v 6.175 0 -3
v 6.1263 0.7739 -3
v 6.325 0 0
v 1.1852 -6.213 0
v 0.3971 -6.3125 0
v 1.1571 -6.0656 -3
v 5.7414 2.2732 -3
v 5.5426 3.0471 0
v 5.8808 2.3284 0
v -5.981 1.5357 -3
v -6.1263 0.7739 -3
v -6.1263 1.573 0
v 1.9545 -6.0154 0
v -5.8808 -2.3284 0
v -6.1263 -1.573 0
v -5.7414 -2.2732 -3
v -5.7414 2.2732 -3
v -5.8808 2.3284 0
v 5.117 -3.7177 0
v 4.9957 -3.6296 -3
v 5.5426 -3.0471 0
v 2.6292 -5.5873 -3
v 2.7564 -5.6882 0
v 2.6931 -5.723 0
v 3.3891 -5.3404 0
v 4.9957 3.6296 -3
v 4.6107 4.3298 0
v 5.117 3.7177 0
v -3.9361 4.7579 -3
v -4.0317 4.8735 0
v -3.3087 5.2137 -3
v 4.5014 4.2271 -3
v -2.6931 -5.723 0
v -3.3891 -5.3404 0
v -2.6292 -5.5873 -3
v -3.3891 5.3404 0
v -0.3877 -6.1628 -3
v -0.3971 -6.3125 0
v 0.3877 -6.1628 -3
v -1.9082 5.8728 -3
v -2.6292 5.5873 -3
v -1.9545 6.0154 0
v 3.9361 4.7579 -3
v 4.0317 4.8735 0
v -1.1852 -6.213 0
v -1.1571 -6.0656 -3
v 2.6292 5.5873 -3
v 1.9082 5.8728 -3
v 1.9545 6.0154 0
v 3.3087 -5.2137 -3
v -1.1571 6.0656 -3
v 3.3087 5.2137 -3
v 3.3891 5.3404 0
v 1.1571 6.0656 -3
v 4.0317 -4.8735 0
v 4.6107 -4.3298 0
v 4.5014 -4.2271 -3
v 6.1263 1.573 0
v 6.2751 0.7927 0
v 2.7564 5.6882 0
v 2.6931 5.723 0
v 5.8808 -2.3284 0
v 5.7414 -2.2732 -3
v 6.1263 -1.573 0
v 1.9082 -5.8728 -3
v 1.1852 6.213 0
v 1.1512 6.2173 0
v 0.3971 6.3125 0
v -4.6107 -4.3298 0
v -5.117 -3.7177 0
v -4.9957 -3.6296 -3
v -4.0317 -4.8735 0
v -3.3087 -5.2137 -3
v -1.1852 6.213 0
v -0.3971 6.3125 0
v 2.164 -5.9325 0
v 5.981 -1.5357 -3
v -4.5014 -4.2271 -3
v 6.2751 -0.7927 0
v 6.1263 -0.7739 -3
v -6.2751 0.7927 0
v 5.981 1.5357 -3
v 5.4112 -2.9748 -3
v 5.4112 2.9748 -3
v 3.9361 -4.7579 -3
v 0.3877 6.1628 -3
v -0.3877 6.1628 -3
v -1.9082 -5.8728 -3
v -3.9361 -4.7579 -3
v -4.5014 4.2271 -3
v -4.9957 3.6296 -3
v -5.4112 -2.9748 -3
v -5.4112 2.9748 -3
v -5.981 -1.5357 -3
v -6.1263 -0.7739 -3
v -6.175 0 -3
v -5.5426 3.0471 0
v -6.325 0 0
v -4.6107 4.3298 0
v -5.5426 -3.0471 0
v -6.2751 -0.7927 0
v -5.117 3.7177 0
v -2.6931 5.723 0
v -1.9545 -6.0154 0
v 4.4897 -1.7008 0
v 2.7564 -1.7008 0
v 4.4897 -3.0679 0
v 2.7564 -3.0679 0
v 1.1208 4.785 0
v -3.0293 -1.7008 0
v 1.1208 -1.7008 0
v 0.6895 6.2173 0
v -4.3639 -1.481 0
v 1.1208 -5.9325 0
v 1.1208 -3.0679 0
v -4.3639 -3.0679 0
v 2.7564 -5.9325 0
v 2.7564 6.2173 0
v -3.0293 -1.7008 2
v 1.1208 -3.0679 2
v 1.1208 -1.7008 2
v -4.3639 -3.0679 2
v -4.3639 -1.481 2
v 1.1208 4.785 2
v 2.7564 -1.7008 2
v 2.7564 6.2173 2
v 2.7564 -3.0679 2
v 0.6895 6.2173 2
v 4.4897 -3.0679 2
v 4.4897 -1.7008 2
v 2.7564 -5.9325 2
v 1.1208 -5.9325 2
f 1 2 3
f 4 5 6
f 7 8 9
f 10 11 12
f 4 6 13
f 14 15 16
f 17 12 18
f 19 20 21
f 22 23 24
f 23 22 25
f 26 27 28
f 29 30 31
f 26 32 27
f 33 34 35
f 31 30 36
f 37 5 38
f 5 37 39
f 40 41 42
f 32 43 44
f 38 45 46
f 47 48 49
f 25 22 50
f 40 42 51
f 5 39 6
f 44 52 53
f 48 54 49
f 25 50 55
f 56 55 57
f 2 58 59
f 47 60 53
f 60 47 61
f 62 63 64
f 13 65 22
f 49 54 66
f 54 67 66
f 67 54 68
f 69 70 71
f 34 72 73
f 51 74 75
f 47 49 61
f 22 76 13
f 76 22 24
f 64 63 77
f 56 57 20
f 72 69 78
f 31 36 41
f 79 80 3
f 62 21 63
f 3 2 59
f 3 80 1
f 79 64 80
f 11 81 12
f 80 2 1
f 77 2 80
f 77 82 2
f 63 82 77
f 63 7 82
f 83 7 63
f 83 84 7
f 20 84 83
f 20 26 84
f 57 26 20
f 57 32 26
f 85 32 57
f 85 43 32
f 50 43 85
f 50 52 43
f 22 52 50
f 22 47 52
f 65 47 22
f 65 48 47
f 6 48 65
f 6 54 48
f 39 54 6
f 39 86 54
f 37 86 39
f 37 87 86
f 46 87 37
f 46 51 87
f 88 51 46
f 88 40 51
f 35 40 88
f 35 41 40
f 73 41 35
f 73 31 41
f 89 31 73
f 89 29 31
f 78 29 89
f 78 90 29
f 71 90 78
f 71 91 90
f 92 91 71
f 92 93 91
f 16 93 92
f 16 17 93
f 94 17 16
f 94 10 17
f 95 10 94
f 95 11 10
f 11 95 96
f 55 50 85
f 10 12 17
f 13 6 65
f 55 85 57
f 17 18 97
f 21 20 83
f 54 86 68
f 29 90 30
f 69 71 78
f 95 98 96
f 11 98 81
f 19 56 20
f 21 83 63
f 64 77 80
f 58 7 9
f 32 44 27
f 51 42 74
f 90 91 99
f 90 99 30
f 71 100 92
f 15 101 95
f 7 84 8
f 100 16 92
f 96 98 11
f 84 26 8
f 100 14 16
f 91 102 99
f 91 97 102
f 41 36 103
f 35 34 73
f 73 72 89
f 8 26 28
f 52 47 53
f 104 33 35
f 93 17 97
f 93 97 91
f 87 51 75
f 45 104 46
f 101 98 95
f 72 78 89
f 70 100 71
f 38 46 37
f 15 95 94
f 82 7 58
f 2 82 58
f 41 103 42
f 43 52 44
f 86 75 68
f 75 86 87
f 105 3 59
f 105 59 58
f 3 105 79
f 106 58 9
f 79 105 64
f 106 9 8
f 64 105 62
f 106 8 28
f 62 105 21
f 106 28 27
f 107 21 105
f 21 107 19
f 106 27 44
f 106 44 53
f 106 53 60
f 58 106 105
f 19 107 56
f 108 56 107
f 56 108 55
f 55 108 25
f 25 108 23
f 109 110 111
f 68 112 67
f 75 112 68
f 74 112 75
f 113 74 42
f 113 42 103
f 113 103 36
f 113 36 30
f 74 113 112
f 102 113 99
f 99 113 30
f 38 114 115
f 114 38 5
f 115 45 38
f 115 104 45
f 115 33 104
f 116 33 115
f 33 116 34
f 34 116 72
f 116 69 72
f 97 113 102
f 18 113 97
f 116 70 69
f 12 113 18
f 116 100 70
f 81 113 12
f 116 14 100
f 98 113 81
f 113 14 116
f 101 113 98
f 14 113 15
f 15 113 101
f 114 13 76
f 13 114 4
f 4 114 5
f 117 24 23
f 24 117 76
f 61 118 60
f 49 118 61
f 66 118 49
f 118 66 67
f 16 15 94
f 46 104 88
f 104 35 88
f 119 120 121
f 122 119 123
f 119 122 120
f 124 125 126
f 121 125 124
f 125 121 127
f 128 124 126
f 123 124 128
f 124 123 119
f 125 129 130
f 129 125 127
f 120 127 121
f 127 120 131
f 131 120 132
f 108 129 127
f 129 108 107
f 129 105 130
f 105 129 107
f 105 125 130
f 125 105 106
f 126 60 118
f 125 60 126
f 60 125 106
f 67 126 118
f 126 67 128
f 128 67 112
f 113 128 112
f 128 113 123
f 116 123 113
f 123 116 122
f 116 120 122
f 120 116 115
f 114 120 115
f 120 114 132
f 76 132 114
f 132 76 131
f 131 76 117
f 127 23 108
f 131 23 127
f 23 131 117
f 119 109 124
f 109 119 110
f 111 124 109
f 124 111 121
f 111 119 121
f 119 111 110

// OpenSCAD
$fn = 50;


difference() {
	union() {
		translate(v = [0, 0, -3.0000000000]) {
			cylinder(h = 3, r1 = 6.1750000000, r2 = 6.3250000000);
		}
		linear_extrude(height = 2) {
			text(font = "Impact", halign = "center", size = 12, text = "4", valign = "center");
		}
	}
	union();
}
